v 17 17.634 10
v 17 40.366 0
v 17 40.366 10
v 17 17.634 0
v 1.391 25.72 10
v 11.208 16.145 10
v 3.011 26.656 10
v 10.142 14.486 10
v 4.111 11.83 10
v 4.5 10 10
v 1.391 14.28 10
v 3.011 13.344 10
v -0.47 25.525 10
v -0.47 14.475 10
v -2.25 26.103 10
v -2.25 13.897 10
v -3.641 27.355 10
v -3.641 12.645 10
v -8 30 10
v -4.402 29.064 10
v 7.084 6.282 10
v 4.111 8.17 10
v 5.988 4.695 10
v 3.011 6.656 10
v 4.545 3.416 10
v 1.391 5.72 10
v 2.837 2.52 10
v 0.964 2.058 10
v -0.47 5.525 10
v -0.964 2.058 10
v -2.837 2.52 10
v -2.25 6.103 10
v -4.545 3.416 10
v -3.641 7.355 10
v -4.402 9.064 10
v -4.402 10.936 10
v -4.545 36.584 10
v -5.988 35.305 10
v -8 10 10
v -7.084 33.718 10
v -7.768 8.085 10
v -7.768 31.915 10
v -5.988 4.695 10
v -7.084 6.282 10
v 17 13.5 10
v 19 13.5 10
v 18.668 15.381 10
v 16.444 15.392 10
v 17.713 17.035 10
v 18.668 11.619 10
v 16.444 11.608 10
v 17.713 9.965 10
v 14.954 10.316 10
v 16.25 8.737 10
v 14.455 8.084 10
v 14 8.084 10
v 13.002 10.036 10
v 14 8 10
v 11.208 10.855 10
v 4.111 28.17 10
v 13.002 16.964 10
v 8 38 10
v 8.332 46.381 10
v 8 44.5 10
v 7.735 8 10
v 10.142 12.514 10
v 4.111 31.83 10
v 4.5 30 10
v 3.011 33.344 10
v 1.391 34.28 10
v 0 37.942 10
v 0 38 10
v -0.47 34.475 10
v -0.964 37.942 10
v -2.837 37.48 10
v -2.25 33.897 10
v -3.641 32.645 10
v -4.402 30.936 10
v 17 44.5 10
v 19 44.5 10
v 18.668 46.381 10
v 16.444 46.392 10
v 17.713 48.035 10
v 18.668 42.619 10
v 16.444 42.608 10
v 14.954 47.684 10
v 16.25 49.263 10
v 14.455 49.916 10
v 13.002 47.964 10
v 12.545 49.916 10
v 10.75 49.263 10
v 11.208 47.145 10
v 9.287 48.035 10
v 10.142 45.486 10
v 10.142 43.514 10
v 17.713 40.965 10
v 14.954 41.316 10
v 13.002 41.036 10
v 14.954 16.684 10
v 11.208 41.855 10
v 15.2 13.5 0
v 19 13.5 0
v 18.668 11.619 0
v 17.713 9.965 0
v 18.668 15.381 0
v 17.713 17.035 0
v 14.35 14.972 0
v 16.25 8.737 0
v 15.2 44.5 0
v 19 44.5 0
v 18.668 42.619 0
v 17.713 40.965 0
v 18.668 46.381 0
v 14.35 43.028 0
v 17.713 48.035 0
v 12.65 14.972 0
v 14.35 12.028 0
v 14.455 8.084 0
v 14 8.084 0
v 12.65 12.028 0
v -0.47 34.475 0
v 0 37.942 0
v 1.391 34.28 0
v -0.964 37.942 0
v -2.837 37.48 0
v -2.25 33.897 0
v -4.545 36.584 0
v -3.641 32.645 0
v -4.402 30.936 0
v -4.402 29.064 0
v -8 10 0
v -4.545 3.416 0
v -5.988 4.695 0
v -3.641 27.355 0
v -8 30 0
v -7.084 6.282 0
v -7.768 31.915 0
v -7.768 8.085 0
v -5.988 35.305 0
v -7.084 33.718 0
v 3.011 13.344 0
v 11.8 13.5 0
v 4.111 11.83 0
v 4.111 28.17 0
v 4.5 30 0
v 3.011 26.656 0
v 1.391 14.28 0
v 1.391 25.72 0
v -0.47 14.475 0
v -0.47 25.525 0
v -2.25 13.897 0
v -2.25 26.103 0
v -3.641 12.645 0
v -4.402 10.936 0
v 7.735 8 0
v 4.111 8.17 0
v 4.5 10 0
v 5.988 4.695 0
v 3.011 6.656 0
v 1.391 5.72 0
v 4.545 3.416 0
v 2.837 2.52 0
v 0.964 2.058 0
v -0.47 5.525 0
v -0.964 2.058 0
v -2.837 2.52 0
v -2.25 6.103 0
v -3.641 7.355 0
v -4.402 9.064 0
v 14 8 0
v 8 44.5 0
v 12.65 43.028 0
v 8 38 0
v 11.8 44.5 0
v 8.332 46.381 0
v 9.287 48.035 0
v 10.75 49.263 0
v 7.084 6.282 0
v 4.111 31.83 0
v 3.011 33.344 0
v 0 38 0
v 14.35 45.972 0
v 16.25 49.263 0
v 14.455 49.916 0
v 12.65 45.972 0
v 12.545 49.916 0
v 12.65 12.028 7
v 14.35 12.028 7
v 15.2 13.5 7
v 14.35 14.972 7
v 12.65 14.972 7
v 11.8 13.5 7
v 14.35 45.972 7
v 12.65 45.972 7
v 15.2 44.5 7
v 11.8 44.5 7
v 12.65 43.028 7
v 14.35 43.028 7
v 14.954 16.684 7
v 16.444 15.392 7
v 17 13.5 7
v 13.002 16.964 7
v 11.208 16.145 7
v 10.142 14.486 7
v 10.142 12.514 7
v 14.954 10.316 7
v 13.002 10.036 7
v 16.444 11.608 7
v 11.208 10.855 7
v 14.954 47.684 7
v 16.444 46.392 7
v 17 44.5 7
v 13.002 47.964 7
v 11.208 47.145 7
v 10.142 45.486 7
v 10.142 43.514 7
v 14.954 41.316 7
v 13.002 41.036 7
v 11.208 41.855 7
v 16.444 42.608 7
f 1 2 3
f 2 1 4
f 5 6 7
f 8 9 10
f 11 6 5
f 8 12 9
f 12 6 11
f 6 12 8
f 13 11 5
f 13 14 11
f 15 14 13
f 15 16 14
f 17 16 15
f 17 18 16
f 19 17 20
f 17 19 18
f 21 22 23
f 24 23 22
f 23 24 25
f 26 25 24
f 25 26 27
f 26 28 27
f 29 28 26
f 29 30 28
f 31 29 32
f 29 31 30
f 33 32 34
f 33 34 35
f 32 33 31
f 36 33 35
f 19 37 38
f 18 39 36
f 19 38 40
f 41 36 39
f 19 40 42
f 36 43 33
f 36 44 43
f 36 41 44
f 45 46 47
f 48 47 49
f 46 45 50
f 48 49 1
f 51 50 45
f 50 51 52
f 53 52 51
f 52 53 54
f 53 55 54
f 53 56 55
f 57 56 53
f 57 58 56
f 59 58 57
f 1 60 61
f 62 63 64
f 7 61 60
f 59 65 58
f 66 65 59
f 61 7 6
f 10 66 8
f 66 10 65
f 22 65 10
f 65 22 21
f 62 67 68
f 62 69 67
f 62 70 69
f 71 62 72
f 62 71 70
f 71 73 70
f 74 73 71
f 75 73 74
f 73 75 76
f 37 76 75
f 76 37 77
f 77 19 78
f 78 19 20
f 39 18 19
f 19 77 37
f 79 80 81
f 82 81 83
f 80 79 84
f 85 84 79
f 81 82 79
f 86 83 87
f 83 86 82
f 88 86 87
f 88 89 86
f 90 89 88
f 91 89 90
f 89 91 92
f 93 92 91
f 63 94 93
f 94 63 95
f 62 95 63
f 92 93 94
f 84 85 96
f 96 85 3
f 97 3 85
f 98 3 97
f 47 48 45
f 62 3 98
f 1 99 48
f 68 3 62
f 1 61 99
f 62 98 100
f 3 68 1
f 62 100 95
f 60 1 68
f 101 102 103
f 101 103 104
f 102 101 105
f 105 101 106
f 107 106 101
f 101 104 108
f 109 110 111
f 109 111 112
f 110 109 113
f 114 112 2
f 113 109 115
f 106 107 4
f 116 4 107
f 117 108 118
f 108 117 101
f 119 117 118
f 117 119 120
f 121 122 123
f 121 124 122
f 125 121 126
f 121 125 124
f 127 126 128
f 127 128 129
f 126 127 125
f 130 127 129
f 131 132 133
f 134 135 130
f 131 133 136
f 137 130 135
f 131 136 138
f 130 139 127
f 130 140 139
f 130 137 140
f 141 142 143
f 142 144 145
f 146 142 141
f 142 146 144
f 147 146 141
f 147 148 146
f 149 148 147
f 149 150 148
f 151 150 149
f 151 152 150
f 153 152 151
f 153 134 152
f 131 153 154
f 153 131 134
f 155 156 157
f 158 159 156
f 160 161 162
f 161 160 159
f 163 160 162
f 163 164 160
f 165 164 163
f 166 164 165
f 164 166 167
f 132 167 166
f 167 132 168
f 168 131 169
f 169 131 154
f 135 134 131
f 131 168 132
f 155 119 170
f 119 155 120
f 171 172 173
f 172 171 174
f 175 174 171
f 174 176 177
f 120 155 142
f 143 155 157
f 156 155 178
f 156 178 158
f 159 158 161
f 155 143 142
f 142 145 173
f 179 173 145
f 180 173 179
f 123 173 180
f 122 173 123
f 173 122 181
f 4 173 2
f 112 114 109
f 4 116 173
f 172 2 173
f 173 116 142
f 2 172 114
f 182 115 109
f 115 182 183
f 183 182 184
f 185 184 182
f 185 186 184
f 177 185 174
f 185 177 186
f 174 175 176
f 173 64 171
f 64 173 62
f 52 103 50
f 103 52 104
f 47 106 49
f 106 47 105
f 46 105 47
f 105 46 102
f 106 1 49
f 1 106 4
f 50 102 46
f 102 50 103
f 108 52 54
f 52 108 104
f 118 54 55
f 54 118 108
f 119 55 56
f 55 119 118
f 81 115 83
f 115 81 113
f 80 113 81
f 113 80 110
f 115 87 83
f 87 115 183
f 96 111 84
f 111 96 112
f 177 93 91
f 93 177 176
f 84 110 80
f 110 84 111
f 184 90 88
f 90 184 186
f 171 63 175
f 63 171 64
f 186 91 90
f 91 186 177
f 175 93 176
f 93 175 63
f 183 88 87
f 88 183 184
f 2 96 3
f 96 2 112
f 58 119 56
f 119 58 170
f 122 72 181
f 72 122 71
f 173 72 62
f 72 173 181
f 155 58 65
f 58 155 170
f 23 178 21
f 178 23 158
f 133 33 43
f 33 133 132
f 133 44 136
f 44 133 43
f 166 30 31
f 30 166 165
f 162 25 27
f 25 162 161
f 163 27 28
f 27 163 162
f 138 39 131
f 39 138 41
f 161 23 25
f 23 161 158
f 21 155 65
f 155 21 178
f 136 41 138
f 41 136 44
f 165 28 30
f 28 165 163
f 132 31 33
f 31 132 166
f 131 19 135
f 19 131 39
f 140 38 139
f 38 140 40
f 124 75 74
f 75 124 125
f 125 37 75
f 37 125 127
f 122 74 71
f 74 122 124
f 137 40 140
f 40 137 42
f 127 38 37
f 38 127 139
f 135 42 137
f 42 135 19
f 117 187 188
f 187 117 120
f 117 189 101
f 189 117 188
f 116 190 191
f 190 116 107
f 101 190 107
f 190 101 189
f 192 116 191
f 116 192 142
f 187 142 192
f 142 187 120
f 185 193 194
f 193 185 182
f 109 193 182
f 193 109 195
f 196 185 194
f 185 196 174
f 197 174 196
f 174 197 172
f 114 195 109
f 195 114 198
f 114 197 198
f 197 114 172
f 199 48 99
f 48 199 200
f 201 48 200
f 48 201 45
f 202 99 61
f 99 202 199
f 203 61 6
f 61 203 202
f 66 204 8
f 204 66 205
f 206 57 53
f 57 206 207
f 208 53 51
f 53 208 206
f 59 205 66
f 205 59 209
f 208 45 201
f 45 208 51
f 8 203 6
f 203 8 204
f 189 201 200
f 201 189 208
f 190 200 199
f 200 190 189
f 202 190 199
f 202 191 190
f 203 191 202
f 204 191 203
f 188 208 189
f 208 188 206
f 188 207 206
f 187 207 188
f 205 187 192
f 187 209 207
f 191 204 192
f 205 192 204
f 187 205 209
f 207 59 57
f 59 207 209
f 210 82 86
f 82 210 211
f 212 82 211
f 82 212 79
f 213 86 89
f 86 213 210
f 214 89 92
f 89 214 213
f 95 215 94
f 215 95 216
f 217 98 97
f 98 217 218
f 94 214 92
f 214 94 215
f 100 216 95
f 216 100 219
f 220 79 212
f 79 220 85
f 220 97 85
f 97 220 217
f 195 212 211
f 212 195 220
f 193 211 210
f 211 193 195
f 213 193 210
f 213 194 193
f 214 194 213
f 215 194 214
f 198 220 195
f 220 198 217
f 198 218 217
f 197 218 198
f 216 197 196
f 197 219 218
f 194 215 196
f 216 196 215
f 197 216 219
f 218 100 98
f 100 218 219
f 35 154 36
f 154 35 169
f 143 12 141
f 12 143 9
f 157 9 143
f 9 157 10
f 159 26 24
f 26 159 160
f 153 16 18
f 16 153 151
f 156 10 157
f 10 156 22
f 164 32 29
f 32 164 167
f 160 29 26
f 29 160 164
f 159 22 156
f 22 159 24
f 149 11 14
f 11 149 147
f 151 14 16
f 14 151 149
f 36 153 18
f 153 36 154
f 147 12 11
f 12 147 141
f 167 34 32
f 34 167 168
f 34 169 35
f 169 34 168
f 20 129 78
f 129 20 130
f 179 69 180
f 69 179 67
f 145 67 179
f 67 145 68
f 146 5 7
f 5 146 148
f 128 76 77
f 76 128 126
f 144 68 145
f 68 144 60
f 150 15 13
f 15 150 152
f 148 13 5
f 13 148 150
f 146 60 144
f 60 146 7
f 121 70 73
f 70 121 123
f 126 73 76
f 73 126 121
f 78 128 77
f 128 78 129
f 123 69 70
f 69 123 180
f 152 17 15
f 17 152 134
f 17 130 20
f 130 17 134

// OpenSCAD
// PRUSA iteration3
// Y motor mount
// GNU GPL v3
// Josef Průša <iam@josefprusa.cz> and contributors
// http://www.reprap.org/wiki/Prusa_Mendel
// http://prusamendel.org

//include <configuration.scad>

module y_motor_base(){
 // Motor holding part
 translate(v = [29,-21+50,0]){
  translate(v = [-21+4.5,0,5]) cube(size = [9,31,10], center=true);
  translate(v = [-15.5,-15.5,0]) cylinder(h = 10, r=5.5);
  translate(v = [-15.5,+15.5,0]) cylinder(h = 10, r=5.5);
  // Joins motor holder and rod plate
  translate(v = [-29,-21,0]) cube(size = [14,30,10]);
 }
 // Front holding part
 translate(v = [0,10,0]) cylinder(h = 10, r=8);
 translate(v = [0,20,5])cube(size = [16,20,10], center=true);	
 translate(v = [0,30,0])cylinder(h = 10, r=8);
}

module y_motor_holes(){
 translate(v = [29,-21+50,0]){
  // Screw head holes
  translate(v = [-15.5,-15.5,-1]) cylinder(h = 10, r=1.7);
  translate(v = [-15.5,+15.5,-1]) cylinder(h = 10, r=1.7);
  // Screw holes
  translate(v = [-15.5,-15.5,7]) cylinder(h = 7, r=3.5);
  translate(v = [-15.5,+15.5,7]) cylinder(h = 7, r=3.5);
 }
 translate(v = [0,10,-1]) cylinder(h = 12, r=4.5);	
 translate(v = [0,30,-1])cylinder(h = 12, r=4.5);
}

// Final part
module y_motor(){
 difference(){
  y_motor_base();
  y_motor_holes();
 }
}

y_motor();
